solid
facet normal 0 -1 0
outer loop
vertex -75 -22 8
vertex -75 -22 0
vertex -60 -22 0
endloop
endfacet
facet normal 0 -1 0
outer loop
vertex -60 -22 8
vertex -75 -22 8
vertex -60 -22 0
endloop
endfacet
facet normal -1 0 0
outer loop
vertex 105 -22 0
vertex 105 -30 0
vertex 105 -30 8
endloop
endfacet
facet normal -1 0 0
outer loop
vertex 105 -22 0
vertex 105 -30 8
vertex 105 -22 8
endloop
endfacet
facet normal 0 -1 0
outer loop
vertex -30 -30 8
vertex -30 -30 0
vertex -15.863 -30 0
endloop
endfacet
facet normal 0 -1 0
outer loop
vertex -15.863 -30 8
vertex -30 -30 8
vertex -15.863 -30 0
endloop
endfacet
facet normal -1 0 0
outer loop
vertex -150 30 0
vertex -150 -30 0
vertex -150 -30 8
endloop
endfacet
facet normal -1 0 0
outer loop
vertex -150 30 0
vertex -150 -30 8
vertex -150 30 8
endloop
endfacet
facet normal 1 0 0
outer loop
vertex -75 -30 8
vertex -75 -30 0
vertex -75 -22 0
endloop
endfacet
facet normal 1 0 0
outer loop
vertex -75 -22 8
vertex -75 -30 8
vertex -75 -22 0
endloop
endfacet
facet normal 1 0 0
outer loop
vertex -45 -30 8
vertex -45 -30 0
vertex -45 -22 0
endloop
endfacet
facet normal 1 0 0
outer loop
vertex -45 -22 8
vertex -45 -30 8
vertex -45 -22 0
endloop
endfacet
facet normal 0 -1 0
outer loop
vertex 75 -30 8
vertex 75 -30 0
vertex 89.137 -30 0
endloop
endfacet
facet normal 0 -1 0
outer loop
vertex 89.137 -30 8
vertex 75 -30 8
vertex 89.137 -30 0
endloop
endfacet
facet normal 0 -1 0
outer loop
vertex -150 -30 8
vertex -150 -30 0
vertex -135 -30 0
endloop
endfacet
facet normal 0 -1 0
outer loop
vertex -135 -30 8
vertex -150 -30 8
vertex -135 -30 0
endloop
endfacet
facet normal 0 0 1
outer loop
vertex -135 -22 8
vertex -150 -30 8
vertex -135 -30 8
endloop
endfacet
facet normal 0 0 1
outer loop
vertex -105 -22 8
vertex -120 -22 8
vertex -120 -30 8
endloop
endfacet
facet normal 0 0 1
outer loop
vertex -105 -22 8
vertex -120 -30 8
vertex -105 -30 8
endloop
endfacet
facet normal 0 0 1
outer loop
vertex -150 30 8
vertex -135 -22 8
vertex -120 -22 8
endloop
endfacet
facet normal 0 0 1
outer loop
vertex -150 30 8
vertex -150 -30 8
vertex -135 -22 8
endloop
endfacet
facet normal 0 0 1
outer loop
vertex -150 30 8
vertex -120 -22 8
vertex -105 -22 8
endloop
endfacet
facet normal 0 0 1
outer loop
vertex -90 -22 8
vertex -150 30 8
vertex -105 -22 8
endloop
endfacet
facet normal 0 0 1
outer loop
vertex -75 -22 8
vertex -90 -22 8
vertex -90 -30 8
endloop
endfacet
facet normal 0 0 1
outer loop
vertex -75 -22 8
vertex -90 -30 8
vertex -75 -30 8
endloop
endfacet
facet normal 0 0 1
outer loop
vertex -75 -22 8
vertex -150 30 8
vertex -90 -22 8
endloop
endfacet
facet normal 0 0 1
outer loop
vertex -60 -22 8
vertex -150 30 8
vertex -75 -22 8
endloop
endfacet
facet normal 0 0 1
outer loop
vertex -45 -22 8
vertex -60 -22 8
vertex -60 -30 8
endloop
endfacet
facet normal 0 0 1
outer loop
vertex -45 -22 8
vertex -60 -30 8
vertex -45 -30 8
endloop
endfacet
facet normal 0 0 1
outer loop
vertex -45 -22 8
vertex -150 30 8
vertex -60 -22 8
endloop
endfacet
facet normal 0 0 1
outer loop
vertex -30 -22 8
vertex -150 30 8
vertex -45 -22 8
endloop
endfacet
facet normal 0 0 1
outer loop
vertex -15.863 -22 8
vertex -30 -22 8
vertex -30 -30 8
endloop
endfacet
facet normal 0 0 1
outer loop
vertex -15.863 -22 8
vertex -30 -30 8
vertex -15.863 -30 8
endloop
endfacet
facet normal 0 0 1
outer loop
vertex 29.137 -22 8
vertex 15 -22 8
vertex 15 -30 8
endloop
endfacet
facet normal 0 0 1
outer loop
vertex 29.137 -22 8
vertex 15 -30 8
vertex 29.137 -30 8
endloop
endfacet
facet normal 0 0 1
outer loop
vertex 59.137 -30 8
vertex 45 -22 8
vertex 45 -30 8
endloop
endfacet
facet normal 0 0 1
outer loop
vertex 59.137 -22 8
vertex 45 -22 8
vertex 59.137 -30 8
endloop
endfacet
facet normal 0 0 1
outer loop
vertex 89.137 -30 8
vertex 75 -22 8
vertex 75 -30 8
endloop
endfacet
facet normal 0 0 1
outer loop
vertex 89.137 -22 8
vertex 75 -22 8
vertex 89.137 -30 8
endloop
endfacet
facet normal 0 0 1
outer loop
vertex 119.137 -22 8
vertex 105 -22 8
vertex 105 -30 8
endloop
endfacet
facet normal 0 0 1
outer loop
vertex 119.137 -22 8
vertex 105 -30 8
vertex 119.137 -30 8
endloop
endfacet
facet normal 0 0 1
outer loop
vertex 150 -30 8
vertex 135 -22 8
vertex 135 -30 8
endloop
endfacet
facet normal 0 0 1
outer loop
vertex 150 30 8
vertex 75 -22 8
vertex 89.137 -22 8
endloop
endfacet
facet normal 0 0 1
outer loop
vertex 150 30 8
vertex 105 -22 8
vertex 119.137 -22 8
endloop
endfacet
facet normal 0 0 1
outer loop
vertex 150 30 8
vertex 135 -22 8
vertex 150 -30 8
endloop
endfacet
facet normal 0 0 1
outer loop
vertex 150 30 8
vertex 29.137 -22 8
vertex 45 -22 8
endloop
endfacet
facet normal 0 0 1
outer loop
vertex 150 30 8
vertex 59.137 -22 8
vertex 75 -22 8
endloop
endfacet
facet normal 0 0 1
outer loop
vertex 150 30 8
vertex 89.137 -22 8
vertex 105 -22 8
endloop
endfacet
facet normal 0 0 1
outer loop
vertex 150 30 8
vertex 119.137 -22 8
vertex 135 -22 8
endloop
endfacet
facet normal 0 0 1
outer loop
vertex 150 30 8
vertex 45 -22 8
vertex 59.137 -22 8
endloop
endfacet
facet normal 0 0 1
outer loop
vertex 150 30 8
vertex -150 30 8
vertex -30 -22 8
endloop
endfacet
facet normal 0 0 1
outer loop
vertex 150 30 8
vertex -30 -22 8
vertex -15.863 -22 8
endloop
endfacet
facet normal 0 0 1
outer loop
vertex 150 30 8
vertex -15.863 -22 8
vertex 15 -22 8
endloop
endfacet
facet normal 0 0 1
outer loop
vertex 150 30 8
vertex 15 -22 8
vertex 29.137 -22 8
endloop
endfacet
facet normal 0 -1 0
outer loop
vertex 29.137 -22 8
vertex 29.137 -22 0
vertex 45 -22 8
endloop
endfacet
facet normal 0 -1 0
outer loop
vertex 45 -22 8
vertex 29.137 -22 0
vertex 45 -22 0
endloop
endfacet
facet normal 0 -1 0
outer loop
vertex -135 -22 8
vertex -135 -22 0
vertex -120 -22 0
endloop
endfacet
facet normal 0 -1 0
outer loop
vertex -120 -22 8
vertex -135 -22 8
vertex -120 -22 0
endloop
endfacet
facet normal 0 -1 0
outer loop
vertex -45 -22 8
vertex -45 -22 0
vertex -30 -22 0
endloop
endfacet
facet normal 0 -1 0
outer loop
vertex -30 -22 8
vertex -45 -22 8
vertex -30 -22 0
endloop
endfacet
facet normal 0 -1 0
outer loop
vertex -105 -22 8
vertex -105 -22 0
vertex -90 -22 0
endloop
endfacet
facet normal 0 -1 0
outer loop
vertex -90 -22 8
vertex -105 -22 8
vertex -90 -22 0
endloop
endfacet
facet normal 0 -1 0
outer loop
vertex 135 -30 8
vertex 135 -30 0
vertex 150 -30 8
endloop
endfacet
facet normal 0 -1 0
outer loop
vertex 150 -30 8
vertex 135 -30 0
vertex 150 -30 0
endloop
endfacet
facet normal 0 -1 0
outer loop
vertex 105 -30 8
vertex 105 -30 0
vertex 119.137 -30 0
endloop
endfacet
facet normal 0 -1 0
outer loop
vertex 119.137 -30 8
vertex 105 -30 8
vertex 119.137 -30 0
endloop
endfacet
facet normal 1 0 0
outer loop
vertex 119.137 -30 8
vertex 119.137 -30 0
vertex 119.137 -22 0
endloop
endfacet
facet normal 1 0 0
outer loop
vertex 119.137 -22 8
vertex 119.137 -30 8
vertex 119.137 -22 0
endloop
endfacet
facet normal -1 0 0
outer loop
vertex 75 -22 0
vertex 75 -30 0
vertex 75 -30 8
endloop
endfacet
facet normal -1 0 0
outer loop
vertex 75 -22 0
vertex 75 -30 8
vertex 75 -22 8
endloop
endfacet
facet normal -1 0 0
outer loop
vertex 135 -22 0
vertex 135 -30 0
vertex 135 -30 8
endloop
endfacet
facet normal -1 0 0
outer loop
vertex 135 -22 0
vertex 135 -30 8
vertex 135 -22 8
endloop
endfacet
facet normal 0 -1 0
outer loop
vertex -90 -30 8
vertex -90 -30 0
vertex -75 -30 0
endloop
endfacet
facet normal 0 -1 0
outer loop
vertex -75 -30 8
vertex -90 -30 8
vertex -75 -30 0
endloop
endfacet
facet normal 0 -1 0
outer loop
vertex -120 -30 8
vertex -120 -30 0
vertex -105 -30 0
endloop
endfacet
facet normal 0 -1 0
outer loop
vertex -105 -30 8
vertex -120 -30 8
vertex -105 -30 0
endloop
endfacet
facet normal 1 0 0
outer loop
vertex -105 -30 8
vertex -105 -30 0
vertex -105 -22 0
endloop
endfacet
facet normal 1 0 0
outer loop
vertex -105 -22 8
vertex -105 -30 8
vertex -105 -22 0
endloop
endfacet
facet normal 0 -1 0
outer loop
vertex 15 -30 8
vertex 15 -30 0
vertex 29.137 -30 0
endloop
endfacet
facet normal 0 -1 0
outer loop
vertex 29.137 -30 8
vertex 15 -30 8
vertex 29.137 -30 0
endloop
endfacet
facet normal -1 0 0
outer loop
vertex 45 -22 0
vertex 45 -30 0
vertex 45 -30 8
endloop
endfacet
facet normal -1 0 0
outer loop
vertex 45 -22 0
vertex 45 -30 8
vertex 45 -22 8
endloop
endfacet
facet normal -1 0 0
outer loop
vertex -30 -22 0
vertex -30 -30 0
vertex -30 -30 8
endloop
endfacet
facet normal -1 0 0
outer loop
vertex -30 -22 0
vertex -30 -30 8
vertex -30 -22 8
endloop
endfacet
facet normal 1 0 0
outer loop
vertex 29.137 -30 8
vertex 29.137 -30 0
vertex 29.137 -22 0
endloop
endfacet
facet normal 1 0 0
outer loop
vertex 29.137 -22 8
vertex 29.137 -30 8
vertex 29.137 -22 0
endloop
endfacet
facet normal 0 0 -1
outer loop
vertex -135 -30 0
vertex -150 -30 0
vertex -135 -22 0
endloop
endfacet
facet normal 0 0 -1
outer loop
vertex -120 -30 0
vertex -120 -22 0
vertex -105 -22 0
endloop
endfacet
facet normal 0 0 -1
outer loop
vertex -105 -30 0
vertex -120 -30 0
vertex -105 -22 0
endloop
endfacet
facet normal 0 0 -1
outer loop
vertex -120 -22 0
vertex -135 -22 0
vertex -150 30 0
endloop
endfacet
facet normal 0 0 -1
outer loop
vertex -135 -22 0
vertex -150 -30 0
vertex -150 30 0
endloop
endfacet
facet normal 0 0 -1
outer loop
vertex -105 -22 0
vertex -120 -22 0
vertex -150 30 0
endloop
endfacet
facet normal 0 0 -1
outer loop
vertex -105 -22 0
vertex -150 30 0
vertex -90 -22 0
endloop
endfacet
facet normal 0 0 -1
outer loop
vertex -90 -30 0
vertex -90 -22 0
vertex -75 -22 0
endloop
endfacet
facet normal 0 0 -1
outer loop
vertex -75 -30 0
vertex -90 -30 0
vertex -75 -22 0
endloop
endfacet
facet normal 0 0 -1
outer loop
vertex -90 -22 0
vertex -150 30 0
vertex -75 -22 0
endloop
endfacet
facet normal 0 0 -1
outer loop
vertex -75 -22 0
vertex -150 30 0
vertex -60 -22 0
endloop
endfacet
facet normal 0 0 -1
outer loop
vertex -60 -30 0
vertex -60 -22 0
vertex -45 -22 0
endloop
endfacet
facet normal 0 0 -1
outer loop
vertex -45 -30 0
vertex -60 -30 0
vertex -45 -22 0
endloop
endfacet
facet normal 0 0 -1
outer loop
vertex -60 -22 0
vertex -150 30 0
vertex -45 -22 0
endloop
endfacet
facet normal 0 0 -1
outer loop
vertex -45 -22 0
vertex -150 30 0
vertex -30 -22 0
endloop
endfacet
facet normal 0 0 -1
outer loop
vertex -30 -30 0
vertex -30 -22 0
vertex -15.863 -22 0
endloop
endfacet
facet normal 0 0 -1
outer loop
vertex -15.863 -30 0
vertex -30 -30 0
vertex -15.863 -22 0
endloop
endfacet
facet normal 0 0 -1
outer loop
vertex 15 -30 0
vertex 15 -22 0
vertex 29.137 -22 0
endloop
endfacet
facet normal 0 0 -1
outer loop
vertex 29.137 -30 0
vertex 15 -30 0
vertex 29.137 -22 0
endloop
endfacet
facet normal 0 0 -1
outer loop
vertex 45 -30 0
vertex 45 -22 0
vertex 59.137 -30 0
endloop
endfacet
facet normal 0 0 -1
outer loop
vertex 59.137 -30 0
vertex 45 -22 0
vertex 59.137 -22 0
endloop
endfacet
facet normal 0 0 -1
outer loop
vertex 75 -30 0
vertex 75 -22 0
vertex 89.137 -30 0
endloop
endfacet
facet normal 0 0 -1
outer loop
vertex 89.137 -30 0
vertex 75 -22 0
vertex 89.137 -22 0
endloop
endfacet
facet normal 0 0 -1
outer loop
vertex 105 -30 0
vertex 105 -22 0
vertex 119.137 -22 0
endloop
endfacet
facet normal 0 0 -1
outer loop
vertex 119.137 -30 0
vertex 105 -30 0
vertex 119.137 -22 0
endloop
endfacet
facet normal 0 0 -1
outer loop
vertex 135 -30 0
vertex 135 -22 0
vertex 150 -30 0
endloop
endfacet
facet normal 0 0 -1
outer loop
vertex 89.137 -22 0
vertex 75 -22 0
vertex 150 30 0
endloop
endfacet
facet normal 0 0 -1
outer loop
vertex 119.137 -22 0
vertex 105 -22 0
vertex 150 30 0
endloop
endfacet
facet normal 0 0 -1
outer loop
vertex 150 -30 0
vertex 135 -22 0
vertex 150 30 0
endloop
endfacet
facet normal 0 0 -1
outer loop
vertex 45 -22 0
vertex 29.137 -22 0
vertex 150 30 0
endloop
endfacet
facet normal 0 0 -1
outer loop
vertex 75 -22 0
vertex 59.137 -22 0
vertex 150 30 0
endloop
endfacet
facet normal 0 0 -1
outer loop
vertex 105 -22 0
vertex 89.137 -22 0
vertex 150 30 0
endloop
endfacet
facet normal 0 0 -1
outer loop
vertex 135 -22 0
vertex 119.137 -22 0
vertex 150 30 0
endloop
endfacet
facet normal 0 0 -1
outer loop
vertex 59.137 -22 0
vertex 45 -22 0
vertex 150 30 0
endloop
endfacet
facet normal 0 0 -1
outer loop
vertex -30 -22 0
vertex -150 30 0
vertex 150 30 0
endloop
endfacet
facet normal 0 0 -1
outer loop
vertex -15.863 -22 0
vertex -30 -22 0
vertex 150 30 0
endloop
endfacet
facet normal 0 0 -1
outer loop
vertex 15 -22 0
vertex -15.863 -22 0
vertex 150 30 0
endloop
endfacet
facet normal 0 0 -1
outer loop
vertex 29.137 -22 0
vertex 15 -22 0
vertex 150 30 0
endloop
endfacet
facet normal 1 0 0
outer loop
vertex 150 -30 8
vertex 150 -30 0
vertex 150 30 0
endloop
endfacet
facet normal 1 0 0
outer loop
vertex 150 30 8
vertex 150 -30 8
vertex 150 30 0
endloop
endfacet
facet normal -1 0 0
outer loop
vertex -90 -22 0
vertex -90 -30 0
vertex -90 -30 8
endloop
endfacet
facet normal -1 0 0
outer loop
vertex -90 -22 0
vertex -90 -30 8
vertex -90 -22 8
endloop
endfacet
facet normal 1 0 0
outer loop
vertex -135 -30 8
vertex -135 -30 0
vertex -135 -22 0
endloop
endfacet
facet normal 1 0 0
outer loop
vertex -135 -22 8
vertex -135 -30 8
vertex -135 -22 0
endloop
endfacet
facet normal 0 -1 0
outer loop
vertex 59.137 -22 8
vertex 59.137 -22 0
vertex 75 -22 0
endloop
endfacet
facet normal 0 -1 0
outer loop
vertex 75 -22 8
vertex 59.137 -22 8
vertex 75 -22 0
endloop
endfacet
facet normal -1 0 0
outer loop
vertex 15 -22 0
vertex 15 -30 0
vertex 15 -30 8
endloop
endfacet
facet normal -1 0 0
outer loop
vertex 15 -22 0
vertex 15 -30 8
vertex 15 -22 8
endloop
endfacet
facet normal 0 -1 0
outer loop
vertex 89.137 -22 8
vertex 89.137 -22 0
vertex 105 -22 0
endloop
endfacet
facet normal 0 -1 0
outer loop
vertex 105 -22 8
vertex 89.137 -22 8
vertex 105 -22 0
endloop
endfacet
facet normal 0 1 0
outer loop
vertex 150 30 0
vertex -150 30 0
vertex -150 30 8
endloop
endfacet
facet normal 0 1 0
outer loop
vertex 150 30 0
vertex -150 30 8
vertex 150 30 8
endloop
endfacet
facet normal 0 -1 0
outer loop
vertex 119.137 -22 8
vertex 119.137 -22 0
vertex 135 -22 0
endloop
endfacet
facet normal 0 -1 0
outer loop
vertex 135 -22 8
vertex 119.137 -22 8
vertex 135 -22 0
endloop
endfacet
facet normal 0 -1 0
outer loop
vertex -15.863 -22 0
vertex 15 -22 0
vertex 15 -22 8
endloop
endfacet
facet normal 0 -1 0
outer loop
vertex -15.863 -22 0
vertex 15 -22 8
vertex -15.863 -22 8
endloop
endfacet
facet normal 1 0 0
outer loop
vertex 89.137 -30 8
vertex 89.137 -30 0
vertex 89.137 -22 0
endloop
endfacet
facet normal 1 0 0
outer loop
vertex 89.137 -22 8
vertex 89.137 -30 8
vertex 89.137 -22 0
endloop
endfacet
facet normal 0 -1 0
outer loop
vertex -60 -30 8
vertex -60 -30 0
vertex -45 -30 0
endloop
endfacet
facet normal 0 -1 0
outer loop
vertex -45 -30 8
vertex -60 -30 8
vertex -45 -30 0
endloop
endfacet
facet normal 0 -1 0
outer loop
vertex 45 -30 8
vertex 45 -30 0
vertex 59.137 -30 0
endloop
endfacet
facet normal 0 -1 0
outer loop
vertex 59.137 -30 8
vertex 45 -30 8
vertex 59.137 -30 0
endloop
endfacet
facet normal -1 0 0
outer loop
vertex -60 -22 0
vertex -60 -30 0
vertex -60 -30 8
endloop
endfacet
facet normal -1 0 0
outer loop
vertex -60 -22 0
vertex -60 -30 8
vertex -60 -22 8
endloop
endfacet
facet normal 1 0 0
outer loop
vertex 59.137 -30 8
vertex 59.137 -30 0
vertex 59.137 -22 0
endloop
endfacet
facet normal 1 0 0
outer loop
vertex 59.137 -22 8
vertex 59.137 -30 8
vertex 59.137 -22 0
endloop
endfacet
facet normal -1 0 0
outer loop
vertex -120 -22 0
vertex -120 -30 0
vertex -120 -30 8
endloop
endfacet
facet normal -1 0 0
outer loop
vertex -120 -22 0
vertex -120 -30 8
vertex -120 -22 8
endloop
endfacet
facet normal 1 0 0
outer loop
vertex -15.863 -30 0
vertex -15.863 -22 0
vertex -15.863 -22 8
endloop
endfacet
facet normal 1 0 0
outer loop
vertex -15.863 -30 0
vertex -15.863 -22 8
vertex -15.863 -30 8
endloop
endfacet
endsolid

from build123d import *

# Parameters (mm, degrees)
ESQUISSE1_W             = 300
ESQUISSE1_H             = 60
BOSS_EXTRU_1_DEPTH      = 8
ESQUISSE2_W             = 15.862965147
ESQUISSE2_H             = 8
ESQUISSE2_W_2           = 15
ENL_V_MAT_EXTRU_1_DEPTH = 8


with BuildPart() as part:
    # Esquisse1 → Boss.-Extru.1 (new body)
    with BuildSketch(Plane.XY):
        Rectangle(ESQUISSE1_W, ESQUISSE1_H)
    extrude(amount=BOSS_EXTRU_1_DEPTH)

    # Esquisse2 → Enlèv. mat.-Extru.1 (cut)
    with BuildSketch(Plane.XY):
        Polygon((-0.862965147, -30), (15, -30), (15, -22), (-0.862965147, -22), (-15.862965147, -22), (-15.862965147, -30), align=None)
        with Locations((37.068517427, -26)):
            Rectangle(ESQUISSE2_W, ESQUISSE2_H)
        with Locations((67.068517426, -26)):
            Rectangle(ESQUISSE2_W, ESQUISSE2_H)
        with Locations((97.068517426, -26)):
            Rectangle(ESQUISSE2_W, ESQUISSE2_H)
        with Locations((127.068517426, -26)):
            Rectangle(ESQUISSE2_W, ESQUISSE2_H)
        with Locations((-127.5, -26)):
            Rectangle(ESQUISSE2_W_2, ESQUISSE2_H)
        with Locations((-97.5, -26)):
            Rectangle(ESQUISSE2_W_2, ESQUISSE2_H)
        with Locations((-67.5, -26)):
            Rectangle(ESQUISSE2_W_2, ESQUISSE2_H)
        with Locations((-37.5, -26)):
            Rectangle(ESQUISSE2_W_2, ESQUISSE2_H)
    extrude(amount=ENL_V_MAT_EXTRU_1_DEPTH, mode=Mode.SUBTRACT)


solid = part.part
